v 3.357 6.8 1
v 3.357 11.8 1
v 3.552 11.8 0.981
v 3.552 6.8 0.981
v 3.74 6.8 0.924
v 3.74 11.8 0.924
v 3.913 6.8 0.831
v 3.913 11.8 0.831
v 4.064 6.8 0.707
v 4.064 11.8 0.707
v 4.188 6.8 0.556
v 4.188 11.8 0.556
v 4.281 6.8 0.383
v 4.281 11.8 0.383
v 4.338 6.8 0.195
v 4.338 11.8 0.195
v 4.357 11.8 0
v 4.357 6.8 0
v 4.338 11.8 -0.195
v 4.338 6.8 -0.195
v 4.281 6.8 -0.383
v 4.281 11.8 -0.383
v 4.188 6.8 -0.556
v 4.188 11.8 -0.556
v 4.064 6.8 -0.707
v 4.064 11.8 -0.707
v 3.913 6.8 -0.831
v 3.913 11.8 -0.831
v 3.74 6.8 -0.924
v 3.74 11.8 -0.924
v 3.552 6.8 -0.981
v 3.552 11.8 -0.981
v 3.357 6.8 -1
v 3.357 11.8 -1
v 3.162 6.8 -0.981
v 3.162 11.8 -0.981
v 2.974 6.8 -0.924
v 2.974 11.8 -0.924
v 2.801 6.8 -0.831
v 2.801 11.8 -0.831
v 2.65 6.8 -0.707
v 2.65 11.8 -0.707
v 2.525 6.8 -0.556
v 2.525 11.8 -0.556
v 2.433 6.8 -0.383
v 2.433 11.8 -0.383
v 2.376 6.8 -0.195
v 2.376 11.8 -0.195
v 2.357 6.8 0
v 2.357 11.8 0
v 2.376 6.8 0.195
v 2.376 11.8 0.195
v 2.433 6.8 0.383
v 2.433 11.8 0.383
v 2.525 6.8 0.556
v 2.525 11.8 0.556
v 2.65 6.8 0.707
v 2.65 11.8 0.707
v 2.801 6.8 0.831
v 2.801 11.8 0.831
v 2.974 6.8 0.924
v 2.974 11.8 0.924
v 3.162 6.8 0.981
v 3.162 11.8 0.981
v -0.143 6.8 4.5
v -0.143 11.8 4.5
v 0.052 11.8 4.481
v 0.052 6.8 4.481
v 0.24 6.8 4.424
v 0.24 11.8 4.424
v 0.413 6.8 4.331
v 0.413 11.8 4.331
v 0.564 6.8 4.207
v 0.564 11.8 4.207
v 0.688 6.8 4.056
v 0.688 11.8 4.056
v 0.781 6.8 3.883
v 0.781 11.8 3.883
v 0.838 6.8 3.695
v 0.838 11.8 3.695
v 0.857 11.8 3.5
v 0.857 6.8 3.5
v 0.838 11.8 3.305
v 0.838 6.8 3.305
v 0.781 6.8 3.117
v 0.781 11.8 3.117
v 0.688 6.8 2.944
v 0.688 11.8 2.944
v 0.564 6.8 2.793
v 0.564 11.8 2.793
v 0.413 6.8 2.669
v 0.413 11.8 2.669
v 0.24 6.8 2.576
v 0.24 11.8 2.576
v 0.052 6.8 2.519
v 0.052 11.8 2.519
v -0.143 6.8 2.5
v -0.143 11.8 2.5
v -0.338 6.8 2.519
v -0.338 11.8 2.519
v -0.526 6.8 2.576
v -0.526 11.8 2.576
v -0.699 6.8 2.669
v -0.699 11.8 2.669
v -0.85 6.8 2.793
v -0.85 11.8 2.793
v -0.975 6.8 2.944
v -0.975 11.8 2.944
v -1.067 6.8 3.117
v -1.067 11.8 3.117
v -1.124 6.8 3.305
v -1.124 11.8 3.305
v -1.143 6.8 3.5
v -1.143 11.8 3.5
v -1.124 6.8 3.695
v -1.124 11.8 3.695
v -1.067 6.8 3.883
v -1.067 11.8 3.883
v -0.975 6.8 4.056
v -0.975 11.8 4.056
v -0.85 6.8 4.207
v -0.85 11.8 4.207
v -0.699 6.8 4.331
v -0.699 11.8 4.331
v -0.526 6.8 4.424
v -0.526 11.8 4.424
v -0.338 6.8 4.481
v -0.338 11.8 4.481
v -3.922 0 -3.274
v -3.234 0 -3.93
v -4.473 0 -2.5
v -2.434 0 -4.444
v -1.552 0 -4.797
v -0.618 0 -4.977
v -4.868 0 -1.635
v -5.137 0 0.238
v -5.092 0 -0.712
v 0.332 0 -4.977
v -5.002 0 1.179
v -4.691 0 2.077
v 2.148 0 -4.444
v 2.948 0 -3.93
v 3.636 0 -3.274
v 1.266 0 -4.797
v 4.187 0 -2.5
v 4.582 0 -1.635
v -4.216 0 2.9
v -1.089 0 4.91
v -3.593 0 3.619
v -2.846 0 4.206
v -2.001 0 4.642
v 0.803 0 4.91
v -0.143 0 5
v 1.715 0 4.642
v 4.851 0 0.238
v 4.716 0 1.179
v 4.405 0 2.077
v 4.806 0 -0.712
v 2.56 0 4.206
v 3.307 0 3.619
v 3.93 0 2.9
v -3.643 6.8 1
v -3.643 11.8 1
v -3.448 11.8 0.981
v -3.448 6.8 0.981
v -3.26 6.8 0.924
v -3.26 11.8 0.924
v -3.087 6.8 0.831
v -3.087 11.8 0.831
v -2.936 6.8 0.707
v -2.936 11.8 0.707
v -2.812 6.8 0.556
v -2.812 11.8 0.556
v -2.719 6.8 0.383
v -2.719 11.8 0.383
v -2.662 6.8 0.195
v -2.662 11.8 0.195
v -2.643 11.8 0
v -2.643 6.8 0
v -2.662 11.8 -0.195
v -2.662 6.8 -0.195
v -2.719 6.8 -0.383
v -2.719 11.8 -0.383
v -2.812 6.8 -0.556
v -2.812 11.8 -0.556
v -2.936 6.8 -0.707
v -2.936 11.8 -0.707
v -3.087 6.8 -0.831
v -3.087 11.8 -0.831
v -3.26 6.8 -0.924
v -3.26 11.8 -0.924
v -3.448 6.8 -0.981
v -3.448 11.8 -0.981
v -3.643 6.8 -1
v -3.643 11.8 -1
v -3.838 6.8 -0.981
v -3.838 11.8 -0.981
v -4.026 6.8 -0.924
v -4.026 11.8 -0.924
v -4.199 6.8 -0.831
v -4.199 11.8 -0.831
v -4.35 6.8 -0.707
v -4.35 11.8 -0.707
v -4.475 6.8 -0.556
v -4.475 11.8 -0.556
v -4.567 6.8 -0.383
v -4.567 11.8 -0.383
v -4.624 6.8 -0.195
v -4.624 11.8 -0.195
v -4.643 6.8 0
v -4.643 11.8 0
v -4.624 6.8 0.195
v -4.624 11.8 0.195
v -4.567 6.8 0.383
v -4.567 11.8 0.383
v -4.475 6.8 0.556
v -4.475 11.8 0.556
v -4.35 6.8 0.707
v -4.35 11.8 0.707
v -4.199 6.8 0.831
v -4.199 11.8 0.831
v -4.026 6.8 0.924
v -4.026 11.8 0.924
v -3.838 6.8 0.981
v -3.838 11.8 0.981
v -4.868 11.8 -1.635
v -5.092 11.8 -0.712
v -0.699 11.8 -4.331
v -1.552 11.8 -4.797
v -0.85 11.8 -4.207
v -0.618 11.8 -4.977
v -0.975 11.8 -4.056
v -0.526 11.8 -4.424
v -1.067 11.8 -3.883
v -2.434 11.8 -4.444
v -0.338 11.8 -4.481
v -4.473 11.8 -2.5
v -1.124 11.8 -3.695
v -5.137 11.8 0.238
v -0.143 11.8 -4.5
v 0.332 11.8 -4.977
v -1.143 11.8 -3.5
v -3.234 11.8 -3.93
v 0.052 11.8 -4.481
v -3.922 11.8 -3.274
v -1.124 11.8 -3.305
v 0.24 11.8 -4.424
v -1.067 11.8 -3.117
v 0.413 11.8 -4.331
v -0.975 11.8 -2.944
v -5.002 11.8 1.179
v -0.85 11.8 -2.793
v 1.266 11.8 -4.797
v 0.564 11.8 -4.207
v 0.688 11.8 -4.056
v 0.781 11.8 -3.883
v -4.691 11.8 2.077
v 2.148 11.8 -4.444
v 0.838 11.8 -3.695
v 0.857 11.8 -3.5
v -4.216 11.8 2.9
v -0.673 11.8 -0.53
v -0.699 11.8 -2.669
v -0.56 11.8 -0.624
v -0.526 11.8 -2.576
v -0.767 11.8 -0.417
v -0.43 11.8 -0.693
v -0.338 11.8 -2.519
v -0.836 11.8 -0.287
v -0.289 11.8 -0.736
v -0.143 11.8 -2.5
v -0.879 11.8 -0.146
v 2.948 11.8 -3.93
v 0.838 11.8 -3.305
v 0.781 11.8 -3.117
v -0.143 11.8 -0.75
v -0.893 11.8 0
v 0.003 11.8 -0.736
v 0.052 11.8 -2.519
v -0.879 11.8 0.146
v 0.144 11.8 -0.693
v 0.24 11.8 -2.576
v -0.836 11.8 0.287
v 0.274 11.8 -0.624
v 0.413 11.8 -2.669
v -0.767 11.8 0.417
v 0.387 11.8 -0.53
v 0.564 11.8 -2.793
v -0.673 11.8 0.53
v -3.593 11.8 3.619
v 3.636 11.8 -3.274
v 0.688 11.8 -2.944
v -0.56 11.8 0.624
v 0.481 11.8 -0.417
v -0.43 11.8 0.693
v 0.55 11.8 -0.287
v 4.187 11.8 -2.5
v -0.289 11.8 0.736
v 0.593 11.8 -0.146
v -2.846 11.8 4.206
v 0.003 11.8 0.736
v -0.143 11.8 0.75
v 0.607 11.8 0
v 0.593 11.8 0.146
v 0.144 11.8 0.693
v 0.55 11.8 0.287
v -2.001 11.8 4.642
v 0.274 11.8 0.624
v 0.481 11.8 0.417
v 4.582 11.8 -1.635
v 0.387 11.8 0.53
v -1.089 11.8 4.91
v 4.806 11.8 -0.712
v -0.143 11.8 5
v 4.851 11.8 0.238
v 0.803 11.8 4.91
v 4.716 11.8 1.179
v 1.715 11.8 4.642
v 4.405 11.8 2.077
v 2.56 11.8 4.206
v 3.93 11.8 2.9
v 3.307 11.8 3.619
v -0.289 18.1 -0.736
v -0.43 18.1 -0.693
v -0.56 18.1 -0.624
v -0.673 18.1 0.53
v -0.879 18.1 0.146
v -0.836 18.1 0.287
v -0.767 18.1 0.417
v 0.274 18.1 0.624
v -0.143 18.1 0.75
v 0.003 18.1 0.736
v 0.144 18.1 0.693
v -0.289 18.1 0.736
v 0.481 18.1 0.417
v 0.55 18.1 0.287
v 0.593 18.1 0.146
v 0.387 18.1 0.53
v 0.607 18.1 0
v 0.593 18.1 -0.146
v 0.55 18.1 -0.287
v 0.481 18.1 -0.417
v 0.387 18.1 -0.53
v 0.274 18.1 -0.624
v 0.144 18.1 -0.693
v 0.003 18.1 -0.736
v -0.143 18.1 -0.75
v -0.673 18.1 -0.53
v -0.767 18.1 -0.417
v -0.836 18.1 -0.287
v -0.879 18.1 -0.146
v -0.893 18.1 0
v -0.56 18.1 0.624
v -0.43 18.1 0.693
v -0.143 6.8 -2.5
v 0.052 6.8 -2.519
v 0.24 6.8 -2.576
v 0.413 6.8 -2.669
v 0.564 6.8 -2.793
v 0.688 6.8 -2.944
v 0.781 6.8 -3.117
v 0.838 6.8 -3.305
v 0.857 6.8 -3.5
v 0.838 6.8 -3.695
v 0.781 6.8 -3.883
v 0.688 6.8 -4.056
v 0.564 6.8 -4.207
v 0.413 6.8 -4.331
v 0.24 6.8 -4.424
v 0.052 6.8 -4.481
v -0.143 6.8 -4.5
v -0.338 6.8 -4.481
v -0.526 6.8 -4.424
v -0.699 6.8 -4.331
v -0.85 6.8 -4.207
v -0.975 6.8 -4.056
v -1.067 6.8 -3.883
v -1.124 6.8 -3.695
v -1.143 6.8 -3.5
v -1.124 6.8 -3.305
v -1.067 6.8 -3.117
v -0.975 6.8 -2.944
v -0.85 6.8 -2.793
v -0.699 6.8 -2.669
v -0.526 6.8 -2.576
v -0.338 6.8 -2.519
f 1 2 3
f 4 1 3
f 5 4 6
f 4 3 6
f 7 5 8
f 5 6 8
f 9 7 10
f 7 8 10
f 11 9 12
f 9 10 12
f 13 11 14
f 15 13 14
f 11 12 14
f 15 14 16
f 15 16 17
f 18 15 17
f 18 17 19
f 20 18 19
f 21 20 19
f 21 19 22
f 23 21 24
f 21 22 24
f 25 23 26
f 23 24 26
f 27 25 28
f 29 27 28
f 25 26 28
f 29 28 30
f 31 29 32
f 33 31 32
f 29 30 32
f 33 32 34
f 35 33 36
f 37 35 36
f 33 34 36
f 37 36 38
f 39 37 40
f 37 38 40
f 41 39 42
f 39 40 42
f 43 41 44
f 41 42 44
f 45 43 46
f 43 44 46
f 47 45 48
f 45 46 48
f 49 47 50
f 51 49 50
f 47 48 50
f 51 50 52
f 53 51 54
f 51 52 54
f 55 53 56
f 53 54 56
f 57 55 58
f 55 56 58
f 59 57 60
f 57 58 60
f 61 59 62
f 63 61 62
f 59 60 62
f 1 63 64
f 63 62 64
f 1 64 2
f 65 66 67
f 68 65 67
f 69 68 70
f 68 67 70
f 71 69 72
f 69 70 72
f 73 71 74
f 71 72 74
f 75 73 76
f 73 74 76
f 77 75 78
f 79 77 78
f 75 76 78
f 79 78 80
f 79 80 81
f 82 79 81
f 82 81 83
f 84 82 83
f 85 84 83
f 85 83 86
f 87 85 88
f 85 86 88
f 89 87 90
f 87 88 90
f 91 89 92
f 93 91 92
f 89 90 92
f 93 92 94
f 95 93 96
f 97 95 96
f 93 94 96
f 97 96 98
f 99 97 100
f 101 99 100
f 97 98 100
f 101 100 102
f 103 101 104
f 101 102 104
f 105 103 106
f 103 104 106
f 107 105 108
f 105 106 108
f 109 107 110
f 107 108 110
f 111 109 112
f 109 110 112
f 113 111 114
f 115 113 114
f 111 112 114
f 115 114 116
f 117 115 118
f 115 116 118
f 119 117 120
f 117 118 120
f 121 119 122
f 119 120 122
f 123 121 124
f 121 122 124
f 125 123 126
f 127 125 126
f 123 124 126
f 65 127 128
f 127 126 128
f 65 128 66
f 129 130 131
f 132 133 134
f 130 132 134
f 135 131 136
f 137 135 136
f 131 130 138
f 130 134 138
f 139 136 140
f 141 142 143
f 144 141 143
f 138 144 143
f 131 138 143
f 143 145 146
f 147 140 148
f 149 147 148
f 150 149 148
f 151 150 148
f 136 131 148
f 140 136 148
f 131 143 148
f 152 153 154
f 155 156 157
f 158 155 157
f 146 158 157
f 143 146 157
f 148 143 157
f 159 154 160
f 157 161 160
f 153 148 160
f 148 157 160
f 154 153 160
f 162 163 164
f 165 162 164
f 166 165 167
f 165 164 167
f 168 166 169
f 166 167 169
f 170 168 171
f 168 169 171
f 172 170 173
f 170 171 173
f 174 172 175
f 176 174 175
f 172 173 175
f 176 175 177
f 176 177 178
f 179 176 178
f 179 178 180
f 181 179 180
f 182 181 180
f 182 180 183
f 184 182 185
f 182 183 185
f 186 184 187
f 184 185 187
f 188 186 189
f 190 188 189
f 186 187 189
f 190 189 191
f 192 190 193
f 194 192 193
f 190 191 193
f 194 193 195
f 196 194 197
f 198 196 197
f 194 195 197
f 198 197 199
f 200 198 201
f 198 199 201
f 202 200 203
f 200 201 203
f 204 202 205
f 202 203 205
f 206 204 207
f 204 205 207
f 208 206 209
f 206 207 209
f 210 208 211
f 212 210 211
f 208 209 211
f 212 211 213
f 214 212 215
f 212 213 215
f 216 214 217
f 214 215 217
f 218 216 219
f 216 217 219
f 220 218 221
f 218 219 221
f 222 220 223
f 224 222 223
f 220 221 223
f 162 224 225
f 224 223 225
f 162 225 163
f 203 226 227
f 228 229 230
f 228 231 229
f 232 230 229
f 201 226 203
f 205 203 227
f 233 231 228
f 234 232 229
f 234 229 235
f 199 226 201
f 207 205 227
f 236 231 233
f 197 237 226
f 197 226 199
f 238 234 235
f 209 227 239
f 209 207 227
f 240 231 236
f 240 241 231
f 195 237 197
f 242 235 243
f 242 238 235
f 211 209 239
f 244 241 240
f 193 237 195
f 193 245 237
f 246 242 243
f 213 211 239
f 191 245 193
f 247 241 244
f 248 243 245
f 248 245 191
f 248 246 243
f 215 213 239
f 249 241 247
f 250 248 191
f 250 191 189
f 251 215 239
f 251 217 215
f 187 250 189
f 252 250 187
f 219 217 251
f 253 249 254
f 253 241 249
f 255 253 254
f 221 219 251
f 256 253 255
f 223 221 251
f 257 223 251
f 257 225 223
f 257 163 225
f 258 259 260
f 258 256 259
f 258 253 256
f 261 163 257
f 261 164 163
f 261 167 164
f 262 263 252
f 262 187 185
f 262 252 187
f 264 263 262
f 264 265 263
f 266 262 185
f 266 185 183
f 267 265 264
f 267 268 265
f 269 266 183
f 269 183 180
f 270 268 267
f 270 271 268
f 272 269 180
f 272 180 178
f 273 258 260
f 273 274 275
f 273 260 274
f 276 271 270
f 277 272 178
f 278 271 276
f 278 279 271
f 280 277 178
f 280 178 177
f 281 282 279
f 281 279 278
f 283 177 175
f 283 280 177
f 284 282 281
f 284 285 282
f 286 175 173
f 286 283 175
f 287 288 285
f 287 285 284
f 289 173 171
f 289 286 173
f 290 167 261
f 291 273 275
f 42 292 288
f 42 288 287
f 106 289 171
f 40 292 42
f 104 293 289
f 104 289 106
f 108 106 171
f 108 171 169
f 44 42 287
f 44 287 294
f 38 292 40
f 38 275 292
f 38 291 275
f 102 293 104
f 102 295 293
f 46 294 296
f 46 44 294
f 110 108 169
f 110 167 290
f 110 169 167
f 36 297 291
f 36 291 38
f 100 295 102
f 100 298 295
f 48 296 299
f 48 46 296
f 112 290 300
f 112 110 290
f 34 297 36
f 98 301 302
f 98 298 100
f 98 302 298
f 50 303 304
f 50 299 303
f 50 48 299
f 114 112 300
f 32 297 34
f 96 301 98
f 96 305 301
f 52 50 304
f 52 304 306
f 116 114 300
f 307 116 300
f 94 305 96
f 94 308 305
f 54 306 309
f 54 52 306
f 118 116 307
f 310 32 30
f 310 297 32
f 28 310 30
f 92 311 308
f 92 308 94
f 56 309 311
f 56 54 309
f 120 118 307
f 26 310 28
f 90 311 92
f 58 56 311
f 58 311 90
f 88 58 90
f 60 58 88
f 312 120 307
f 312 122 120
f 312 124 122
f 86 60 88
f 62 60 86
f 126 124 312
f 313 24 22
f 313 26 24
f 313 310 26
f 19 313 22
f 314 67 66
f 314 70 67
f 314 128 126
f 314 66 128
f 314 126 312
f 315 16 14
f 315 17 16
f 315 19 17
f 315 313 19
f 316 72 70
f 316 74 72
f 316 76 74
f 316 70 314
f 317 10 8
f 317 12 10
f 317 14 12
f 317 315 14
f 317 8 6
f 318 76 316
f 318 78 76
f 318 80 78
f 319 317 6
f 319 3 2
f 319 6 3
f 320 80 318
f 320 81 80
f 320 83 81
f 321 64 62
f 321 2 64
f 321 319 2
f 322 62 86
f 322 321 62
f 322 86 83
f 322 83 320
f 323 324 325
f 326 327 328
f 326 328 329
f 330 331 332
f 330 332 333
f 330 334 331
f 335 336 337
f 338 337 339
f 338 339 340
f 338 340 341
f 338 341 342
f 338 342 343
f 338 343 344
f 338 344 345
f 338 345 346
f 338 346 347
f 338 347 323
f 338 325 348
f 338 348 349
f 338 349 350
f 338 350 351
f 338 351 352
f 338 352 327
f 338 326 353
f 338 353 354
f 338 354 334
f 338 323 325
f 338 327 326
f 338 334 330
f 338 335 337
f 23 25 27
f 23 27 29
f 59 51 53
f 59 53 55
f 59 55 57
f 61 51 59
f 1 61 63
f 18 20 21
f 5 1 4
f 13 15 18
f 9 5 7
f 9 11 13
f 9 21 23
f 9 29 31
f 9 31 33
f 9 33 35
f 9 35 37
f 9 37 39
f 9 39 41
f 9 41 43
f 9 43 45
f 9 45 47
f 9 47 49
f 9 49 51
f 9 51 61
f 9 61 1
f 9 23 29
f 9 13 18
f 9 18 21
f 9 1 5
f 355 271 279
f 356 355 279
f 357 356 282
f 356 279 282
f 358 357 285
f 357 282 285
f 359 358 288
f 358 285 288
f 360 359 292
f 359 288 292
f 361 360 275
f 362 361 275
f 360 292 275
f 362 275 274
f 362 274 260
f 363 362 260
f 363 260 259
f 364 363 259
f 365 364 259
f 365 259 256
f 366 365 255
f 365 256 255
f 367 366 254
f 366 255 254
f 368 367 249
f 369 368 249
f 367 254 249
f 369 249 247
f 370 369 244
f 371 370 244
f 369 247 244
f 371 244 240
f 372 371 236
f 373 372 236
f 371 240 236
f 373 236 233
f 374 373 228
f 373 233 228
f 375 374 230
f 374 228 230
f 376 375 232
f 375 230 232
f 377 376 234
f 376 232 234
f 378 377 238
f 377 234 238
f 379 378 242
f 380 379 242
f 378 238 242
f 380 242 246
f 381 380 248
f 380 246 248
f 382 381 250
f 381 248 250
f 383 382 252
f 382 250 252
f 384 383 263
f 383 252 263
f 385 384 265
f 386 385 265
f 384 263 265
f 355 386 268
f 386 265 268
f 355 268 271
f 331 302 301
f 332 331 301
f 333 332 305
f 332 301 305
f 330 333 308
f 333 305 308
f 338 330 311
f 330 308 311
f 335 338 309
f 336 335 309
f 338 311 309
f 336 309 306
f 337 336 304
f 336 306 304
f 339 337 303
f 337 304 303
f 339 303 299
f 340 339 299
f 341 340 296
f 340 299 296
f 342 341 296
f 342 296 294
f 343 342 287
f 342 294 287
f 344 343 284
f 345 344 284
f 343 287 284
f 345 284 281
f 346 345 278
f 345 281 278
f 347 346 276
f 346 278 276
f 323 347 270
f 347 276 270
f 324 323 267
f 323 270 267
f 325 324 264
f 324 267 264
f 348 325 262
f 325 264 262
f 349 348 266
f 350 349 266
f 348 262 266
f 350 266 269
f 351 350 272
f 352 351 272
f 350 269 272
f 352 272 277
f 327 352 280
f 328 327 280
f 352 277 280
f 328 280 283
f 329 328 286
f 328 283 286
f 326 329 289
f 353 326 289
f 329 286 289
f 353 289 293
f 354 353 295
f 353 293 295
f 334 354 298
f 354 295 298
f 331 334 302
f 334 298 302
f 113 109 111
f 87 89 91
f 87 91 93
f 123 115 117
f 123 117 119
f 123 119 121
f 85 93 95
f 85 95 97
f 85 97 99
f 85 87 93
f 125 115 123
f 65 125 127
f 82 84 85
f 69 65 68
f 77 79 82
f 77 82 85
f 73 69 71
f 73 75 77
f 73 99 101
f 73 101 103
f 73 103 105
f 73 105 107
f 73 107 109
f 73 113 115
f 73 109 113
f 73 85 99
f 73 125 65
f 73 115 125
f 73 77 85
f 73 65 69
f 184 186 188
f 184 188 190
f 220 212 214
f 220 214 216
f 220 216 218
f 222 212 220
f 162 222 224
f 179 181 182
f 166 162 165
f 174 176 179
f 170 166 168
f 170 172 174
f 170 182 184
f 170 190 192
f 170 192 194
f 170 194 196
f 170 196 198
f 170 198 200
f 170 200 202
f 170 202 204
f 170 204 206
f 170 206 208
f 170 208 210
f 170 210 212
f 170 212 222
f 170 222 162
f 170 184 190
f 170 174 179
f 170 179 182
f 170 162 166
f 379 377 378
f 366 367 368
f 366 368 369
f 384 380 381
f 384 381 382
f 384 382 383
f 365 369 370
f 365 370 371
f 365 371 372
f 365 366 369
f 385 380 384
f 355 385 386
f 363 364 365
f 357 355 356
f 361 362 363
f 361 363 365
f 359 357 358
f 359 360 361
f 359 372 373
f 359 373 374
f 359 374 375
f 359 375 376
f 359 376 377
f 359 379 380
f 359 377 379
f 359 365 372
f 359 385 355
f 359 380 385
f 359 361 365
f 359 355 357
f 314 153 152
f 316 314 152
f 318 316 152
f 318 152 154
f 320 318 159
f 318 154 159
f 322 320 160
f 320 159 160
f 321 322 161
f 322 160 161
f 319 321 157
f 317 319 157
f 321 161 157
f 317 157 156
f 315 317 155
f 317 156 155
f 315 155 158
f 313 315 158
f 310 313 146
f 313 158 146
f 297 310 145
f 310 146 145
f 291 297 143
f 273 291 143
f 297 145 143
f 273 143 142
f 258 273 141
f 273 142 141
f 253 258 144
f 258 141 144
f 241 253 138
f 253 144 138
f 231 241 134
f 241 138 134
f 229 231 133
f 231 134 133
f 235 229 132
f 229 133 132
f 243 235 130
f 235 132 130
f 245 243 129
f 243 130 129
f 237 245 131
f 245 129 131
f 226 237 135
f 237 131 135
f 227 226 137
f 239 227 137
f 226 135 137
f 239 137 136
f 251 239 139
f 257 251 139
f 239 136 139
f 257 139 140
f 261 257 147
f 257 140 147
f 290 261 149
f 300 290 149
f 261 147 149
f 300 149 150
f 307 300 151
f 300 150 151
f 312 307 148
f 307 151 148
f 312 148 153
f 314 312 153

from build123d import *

# Parameters (mm, degrees)
SKETCH_1_R          = 5
EXTRUDE_1_DEPTH     = 11.8
SKETCH_2_R          = 0.75
EXTRUDE_3_DEPTH     = 6.3
SKETCH_4_R          = 1
CUT_EXTRUDE_1_DEPTH = 5


with BuildPart() as part:
    # 草图1 → 凸台-拉伸1 (new body)
    with BuildSketch(Plane(origin=(0, 0, 0), x_dir=(1, 0, 0), z_dir=(0, 1, 0))):
        with Locations(Location((-0.143044278, 0, 0), (0, 0, 270))):
            Circle(SKETCH_1_R)
    extrude(amount=EXTRUDE_1_DEPTH)

    # 草图2 → 凸台-拉伸3 (add)
    with BuildSketch(Plane(origin=(0, 11.8, 0), x_dir=(1, 0, 0), z_dir=(0, 1, 0))):
        with Locations(Location((-0.143044278, 0, 0), (0, 0, 270))):
            Circle(SKETCH_2_R)
    extrude(amount=EXTRUDE_3_DEPTH)

    # 草图4 → 切除-拉伸1 (cut)
    with BuildSketch(Plane(origin=(0, 11.8, 0), x_dir=(1, 0, 0), z_dir=(0, 1, 0))):
        with Locations(Location((-0.143044278, -3.5, 0), (0, 0, 270))):
            Circle(SKETCH_4_R)
        with Locations(Location((-3.643044278, 0, 0), (0, 0, 270))):
            Circle(SKETCH_4_R)
        with Locations(Location((-0.143044278, 3.5, 0), (0, 0, 270))):
            Circle(SKETCH_4_R)
        with Locations(Location((3.356955722, 0, 0), (0, 0, 270))):
            Circle(SKETCH_4_R)
    extrude(amount=-CUT_EXTRUDE_1_DEPTH, mode=Mode.SUBTRACT)


solid = part.part
